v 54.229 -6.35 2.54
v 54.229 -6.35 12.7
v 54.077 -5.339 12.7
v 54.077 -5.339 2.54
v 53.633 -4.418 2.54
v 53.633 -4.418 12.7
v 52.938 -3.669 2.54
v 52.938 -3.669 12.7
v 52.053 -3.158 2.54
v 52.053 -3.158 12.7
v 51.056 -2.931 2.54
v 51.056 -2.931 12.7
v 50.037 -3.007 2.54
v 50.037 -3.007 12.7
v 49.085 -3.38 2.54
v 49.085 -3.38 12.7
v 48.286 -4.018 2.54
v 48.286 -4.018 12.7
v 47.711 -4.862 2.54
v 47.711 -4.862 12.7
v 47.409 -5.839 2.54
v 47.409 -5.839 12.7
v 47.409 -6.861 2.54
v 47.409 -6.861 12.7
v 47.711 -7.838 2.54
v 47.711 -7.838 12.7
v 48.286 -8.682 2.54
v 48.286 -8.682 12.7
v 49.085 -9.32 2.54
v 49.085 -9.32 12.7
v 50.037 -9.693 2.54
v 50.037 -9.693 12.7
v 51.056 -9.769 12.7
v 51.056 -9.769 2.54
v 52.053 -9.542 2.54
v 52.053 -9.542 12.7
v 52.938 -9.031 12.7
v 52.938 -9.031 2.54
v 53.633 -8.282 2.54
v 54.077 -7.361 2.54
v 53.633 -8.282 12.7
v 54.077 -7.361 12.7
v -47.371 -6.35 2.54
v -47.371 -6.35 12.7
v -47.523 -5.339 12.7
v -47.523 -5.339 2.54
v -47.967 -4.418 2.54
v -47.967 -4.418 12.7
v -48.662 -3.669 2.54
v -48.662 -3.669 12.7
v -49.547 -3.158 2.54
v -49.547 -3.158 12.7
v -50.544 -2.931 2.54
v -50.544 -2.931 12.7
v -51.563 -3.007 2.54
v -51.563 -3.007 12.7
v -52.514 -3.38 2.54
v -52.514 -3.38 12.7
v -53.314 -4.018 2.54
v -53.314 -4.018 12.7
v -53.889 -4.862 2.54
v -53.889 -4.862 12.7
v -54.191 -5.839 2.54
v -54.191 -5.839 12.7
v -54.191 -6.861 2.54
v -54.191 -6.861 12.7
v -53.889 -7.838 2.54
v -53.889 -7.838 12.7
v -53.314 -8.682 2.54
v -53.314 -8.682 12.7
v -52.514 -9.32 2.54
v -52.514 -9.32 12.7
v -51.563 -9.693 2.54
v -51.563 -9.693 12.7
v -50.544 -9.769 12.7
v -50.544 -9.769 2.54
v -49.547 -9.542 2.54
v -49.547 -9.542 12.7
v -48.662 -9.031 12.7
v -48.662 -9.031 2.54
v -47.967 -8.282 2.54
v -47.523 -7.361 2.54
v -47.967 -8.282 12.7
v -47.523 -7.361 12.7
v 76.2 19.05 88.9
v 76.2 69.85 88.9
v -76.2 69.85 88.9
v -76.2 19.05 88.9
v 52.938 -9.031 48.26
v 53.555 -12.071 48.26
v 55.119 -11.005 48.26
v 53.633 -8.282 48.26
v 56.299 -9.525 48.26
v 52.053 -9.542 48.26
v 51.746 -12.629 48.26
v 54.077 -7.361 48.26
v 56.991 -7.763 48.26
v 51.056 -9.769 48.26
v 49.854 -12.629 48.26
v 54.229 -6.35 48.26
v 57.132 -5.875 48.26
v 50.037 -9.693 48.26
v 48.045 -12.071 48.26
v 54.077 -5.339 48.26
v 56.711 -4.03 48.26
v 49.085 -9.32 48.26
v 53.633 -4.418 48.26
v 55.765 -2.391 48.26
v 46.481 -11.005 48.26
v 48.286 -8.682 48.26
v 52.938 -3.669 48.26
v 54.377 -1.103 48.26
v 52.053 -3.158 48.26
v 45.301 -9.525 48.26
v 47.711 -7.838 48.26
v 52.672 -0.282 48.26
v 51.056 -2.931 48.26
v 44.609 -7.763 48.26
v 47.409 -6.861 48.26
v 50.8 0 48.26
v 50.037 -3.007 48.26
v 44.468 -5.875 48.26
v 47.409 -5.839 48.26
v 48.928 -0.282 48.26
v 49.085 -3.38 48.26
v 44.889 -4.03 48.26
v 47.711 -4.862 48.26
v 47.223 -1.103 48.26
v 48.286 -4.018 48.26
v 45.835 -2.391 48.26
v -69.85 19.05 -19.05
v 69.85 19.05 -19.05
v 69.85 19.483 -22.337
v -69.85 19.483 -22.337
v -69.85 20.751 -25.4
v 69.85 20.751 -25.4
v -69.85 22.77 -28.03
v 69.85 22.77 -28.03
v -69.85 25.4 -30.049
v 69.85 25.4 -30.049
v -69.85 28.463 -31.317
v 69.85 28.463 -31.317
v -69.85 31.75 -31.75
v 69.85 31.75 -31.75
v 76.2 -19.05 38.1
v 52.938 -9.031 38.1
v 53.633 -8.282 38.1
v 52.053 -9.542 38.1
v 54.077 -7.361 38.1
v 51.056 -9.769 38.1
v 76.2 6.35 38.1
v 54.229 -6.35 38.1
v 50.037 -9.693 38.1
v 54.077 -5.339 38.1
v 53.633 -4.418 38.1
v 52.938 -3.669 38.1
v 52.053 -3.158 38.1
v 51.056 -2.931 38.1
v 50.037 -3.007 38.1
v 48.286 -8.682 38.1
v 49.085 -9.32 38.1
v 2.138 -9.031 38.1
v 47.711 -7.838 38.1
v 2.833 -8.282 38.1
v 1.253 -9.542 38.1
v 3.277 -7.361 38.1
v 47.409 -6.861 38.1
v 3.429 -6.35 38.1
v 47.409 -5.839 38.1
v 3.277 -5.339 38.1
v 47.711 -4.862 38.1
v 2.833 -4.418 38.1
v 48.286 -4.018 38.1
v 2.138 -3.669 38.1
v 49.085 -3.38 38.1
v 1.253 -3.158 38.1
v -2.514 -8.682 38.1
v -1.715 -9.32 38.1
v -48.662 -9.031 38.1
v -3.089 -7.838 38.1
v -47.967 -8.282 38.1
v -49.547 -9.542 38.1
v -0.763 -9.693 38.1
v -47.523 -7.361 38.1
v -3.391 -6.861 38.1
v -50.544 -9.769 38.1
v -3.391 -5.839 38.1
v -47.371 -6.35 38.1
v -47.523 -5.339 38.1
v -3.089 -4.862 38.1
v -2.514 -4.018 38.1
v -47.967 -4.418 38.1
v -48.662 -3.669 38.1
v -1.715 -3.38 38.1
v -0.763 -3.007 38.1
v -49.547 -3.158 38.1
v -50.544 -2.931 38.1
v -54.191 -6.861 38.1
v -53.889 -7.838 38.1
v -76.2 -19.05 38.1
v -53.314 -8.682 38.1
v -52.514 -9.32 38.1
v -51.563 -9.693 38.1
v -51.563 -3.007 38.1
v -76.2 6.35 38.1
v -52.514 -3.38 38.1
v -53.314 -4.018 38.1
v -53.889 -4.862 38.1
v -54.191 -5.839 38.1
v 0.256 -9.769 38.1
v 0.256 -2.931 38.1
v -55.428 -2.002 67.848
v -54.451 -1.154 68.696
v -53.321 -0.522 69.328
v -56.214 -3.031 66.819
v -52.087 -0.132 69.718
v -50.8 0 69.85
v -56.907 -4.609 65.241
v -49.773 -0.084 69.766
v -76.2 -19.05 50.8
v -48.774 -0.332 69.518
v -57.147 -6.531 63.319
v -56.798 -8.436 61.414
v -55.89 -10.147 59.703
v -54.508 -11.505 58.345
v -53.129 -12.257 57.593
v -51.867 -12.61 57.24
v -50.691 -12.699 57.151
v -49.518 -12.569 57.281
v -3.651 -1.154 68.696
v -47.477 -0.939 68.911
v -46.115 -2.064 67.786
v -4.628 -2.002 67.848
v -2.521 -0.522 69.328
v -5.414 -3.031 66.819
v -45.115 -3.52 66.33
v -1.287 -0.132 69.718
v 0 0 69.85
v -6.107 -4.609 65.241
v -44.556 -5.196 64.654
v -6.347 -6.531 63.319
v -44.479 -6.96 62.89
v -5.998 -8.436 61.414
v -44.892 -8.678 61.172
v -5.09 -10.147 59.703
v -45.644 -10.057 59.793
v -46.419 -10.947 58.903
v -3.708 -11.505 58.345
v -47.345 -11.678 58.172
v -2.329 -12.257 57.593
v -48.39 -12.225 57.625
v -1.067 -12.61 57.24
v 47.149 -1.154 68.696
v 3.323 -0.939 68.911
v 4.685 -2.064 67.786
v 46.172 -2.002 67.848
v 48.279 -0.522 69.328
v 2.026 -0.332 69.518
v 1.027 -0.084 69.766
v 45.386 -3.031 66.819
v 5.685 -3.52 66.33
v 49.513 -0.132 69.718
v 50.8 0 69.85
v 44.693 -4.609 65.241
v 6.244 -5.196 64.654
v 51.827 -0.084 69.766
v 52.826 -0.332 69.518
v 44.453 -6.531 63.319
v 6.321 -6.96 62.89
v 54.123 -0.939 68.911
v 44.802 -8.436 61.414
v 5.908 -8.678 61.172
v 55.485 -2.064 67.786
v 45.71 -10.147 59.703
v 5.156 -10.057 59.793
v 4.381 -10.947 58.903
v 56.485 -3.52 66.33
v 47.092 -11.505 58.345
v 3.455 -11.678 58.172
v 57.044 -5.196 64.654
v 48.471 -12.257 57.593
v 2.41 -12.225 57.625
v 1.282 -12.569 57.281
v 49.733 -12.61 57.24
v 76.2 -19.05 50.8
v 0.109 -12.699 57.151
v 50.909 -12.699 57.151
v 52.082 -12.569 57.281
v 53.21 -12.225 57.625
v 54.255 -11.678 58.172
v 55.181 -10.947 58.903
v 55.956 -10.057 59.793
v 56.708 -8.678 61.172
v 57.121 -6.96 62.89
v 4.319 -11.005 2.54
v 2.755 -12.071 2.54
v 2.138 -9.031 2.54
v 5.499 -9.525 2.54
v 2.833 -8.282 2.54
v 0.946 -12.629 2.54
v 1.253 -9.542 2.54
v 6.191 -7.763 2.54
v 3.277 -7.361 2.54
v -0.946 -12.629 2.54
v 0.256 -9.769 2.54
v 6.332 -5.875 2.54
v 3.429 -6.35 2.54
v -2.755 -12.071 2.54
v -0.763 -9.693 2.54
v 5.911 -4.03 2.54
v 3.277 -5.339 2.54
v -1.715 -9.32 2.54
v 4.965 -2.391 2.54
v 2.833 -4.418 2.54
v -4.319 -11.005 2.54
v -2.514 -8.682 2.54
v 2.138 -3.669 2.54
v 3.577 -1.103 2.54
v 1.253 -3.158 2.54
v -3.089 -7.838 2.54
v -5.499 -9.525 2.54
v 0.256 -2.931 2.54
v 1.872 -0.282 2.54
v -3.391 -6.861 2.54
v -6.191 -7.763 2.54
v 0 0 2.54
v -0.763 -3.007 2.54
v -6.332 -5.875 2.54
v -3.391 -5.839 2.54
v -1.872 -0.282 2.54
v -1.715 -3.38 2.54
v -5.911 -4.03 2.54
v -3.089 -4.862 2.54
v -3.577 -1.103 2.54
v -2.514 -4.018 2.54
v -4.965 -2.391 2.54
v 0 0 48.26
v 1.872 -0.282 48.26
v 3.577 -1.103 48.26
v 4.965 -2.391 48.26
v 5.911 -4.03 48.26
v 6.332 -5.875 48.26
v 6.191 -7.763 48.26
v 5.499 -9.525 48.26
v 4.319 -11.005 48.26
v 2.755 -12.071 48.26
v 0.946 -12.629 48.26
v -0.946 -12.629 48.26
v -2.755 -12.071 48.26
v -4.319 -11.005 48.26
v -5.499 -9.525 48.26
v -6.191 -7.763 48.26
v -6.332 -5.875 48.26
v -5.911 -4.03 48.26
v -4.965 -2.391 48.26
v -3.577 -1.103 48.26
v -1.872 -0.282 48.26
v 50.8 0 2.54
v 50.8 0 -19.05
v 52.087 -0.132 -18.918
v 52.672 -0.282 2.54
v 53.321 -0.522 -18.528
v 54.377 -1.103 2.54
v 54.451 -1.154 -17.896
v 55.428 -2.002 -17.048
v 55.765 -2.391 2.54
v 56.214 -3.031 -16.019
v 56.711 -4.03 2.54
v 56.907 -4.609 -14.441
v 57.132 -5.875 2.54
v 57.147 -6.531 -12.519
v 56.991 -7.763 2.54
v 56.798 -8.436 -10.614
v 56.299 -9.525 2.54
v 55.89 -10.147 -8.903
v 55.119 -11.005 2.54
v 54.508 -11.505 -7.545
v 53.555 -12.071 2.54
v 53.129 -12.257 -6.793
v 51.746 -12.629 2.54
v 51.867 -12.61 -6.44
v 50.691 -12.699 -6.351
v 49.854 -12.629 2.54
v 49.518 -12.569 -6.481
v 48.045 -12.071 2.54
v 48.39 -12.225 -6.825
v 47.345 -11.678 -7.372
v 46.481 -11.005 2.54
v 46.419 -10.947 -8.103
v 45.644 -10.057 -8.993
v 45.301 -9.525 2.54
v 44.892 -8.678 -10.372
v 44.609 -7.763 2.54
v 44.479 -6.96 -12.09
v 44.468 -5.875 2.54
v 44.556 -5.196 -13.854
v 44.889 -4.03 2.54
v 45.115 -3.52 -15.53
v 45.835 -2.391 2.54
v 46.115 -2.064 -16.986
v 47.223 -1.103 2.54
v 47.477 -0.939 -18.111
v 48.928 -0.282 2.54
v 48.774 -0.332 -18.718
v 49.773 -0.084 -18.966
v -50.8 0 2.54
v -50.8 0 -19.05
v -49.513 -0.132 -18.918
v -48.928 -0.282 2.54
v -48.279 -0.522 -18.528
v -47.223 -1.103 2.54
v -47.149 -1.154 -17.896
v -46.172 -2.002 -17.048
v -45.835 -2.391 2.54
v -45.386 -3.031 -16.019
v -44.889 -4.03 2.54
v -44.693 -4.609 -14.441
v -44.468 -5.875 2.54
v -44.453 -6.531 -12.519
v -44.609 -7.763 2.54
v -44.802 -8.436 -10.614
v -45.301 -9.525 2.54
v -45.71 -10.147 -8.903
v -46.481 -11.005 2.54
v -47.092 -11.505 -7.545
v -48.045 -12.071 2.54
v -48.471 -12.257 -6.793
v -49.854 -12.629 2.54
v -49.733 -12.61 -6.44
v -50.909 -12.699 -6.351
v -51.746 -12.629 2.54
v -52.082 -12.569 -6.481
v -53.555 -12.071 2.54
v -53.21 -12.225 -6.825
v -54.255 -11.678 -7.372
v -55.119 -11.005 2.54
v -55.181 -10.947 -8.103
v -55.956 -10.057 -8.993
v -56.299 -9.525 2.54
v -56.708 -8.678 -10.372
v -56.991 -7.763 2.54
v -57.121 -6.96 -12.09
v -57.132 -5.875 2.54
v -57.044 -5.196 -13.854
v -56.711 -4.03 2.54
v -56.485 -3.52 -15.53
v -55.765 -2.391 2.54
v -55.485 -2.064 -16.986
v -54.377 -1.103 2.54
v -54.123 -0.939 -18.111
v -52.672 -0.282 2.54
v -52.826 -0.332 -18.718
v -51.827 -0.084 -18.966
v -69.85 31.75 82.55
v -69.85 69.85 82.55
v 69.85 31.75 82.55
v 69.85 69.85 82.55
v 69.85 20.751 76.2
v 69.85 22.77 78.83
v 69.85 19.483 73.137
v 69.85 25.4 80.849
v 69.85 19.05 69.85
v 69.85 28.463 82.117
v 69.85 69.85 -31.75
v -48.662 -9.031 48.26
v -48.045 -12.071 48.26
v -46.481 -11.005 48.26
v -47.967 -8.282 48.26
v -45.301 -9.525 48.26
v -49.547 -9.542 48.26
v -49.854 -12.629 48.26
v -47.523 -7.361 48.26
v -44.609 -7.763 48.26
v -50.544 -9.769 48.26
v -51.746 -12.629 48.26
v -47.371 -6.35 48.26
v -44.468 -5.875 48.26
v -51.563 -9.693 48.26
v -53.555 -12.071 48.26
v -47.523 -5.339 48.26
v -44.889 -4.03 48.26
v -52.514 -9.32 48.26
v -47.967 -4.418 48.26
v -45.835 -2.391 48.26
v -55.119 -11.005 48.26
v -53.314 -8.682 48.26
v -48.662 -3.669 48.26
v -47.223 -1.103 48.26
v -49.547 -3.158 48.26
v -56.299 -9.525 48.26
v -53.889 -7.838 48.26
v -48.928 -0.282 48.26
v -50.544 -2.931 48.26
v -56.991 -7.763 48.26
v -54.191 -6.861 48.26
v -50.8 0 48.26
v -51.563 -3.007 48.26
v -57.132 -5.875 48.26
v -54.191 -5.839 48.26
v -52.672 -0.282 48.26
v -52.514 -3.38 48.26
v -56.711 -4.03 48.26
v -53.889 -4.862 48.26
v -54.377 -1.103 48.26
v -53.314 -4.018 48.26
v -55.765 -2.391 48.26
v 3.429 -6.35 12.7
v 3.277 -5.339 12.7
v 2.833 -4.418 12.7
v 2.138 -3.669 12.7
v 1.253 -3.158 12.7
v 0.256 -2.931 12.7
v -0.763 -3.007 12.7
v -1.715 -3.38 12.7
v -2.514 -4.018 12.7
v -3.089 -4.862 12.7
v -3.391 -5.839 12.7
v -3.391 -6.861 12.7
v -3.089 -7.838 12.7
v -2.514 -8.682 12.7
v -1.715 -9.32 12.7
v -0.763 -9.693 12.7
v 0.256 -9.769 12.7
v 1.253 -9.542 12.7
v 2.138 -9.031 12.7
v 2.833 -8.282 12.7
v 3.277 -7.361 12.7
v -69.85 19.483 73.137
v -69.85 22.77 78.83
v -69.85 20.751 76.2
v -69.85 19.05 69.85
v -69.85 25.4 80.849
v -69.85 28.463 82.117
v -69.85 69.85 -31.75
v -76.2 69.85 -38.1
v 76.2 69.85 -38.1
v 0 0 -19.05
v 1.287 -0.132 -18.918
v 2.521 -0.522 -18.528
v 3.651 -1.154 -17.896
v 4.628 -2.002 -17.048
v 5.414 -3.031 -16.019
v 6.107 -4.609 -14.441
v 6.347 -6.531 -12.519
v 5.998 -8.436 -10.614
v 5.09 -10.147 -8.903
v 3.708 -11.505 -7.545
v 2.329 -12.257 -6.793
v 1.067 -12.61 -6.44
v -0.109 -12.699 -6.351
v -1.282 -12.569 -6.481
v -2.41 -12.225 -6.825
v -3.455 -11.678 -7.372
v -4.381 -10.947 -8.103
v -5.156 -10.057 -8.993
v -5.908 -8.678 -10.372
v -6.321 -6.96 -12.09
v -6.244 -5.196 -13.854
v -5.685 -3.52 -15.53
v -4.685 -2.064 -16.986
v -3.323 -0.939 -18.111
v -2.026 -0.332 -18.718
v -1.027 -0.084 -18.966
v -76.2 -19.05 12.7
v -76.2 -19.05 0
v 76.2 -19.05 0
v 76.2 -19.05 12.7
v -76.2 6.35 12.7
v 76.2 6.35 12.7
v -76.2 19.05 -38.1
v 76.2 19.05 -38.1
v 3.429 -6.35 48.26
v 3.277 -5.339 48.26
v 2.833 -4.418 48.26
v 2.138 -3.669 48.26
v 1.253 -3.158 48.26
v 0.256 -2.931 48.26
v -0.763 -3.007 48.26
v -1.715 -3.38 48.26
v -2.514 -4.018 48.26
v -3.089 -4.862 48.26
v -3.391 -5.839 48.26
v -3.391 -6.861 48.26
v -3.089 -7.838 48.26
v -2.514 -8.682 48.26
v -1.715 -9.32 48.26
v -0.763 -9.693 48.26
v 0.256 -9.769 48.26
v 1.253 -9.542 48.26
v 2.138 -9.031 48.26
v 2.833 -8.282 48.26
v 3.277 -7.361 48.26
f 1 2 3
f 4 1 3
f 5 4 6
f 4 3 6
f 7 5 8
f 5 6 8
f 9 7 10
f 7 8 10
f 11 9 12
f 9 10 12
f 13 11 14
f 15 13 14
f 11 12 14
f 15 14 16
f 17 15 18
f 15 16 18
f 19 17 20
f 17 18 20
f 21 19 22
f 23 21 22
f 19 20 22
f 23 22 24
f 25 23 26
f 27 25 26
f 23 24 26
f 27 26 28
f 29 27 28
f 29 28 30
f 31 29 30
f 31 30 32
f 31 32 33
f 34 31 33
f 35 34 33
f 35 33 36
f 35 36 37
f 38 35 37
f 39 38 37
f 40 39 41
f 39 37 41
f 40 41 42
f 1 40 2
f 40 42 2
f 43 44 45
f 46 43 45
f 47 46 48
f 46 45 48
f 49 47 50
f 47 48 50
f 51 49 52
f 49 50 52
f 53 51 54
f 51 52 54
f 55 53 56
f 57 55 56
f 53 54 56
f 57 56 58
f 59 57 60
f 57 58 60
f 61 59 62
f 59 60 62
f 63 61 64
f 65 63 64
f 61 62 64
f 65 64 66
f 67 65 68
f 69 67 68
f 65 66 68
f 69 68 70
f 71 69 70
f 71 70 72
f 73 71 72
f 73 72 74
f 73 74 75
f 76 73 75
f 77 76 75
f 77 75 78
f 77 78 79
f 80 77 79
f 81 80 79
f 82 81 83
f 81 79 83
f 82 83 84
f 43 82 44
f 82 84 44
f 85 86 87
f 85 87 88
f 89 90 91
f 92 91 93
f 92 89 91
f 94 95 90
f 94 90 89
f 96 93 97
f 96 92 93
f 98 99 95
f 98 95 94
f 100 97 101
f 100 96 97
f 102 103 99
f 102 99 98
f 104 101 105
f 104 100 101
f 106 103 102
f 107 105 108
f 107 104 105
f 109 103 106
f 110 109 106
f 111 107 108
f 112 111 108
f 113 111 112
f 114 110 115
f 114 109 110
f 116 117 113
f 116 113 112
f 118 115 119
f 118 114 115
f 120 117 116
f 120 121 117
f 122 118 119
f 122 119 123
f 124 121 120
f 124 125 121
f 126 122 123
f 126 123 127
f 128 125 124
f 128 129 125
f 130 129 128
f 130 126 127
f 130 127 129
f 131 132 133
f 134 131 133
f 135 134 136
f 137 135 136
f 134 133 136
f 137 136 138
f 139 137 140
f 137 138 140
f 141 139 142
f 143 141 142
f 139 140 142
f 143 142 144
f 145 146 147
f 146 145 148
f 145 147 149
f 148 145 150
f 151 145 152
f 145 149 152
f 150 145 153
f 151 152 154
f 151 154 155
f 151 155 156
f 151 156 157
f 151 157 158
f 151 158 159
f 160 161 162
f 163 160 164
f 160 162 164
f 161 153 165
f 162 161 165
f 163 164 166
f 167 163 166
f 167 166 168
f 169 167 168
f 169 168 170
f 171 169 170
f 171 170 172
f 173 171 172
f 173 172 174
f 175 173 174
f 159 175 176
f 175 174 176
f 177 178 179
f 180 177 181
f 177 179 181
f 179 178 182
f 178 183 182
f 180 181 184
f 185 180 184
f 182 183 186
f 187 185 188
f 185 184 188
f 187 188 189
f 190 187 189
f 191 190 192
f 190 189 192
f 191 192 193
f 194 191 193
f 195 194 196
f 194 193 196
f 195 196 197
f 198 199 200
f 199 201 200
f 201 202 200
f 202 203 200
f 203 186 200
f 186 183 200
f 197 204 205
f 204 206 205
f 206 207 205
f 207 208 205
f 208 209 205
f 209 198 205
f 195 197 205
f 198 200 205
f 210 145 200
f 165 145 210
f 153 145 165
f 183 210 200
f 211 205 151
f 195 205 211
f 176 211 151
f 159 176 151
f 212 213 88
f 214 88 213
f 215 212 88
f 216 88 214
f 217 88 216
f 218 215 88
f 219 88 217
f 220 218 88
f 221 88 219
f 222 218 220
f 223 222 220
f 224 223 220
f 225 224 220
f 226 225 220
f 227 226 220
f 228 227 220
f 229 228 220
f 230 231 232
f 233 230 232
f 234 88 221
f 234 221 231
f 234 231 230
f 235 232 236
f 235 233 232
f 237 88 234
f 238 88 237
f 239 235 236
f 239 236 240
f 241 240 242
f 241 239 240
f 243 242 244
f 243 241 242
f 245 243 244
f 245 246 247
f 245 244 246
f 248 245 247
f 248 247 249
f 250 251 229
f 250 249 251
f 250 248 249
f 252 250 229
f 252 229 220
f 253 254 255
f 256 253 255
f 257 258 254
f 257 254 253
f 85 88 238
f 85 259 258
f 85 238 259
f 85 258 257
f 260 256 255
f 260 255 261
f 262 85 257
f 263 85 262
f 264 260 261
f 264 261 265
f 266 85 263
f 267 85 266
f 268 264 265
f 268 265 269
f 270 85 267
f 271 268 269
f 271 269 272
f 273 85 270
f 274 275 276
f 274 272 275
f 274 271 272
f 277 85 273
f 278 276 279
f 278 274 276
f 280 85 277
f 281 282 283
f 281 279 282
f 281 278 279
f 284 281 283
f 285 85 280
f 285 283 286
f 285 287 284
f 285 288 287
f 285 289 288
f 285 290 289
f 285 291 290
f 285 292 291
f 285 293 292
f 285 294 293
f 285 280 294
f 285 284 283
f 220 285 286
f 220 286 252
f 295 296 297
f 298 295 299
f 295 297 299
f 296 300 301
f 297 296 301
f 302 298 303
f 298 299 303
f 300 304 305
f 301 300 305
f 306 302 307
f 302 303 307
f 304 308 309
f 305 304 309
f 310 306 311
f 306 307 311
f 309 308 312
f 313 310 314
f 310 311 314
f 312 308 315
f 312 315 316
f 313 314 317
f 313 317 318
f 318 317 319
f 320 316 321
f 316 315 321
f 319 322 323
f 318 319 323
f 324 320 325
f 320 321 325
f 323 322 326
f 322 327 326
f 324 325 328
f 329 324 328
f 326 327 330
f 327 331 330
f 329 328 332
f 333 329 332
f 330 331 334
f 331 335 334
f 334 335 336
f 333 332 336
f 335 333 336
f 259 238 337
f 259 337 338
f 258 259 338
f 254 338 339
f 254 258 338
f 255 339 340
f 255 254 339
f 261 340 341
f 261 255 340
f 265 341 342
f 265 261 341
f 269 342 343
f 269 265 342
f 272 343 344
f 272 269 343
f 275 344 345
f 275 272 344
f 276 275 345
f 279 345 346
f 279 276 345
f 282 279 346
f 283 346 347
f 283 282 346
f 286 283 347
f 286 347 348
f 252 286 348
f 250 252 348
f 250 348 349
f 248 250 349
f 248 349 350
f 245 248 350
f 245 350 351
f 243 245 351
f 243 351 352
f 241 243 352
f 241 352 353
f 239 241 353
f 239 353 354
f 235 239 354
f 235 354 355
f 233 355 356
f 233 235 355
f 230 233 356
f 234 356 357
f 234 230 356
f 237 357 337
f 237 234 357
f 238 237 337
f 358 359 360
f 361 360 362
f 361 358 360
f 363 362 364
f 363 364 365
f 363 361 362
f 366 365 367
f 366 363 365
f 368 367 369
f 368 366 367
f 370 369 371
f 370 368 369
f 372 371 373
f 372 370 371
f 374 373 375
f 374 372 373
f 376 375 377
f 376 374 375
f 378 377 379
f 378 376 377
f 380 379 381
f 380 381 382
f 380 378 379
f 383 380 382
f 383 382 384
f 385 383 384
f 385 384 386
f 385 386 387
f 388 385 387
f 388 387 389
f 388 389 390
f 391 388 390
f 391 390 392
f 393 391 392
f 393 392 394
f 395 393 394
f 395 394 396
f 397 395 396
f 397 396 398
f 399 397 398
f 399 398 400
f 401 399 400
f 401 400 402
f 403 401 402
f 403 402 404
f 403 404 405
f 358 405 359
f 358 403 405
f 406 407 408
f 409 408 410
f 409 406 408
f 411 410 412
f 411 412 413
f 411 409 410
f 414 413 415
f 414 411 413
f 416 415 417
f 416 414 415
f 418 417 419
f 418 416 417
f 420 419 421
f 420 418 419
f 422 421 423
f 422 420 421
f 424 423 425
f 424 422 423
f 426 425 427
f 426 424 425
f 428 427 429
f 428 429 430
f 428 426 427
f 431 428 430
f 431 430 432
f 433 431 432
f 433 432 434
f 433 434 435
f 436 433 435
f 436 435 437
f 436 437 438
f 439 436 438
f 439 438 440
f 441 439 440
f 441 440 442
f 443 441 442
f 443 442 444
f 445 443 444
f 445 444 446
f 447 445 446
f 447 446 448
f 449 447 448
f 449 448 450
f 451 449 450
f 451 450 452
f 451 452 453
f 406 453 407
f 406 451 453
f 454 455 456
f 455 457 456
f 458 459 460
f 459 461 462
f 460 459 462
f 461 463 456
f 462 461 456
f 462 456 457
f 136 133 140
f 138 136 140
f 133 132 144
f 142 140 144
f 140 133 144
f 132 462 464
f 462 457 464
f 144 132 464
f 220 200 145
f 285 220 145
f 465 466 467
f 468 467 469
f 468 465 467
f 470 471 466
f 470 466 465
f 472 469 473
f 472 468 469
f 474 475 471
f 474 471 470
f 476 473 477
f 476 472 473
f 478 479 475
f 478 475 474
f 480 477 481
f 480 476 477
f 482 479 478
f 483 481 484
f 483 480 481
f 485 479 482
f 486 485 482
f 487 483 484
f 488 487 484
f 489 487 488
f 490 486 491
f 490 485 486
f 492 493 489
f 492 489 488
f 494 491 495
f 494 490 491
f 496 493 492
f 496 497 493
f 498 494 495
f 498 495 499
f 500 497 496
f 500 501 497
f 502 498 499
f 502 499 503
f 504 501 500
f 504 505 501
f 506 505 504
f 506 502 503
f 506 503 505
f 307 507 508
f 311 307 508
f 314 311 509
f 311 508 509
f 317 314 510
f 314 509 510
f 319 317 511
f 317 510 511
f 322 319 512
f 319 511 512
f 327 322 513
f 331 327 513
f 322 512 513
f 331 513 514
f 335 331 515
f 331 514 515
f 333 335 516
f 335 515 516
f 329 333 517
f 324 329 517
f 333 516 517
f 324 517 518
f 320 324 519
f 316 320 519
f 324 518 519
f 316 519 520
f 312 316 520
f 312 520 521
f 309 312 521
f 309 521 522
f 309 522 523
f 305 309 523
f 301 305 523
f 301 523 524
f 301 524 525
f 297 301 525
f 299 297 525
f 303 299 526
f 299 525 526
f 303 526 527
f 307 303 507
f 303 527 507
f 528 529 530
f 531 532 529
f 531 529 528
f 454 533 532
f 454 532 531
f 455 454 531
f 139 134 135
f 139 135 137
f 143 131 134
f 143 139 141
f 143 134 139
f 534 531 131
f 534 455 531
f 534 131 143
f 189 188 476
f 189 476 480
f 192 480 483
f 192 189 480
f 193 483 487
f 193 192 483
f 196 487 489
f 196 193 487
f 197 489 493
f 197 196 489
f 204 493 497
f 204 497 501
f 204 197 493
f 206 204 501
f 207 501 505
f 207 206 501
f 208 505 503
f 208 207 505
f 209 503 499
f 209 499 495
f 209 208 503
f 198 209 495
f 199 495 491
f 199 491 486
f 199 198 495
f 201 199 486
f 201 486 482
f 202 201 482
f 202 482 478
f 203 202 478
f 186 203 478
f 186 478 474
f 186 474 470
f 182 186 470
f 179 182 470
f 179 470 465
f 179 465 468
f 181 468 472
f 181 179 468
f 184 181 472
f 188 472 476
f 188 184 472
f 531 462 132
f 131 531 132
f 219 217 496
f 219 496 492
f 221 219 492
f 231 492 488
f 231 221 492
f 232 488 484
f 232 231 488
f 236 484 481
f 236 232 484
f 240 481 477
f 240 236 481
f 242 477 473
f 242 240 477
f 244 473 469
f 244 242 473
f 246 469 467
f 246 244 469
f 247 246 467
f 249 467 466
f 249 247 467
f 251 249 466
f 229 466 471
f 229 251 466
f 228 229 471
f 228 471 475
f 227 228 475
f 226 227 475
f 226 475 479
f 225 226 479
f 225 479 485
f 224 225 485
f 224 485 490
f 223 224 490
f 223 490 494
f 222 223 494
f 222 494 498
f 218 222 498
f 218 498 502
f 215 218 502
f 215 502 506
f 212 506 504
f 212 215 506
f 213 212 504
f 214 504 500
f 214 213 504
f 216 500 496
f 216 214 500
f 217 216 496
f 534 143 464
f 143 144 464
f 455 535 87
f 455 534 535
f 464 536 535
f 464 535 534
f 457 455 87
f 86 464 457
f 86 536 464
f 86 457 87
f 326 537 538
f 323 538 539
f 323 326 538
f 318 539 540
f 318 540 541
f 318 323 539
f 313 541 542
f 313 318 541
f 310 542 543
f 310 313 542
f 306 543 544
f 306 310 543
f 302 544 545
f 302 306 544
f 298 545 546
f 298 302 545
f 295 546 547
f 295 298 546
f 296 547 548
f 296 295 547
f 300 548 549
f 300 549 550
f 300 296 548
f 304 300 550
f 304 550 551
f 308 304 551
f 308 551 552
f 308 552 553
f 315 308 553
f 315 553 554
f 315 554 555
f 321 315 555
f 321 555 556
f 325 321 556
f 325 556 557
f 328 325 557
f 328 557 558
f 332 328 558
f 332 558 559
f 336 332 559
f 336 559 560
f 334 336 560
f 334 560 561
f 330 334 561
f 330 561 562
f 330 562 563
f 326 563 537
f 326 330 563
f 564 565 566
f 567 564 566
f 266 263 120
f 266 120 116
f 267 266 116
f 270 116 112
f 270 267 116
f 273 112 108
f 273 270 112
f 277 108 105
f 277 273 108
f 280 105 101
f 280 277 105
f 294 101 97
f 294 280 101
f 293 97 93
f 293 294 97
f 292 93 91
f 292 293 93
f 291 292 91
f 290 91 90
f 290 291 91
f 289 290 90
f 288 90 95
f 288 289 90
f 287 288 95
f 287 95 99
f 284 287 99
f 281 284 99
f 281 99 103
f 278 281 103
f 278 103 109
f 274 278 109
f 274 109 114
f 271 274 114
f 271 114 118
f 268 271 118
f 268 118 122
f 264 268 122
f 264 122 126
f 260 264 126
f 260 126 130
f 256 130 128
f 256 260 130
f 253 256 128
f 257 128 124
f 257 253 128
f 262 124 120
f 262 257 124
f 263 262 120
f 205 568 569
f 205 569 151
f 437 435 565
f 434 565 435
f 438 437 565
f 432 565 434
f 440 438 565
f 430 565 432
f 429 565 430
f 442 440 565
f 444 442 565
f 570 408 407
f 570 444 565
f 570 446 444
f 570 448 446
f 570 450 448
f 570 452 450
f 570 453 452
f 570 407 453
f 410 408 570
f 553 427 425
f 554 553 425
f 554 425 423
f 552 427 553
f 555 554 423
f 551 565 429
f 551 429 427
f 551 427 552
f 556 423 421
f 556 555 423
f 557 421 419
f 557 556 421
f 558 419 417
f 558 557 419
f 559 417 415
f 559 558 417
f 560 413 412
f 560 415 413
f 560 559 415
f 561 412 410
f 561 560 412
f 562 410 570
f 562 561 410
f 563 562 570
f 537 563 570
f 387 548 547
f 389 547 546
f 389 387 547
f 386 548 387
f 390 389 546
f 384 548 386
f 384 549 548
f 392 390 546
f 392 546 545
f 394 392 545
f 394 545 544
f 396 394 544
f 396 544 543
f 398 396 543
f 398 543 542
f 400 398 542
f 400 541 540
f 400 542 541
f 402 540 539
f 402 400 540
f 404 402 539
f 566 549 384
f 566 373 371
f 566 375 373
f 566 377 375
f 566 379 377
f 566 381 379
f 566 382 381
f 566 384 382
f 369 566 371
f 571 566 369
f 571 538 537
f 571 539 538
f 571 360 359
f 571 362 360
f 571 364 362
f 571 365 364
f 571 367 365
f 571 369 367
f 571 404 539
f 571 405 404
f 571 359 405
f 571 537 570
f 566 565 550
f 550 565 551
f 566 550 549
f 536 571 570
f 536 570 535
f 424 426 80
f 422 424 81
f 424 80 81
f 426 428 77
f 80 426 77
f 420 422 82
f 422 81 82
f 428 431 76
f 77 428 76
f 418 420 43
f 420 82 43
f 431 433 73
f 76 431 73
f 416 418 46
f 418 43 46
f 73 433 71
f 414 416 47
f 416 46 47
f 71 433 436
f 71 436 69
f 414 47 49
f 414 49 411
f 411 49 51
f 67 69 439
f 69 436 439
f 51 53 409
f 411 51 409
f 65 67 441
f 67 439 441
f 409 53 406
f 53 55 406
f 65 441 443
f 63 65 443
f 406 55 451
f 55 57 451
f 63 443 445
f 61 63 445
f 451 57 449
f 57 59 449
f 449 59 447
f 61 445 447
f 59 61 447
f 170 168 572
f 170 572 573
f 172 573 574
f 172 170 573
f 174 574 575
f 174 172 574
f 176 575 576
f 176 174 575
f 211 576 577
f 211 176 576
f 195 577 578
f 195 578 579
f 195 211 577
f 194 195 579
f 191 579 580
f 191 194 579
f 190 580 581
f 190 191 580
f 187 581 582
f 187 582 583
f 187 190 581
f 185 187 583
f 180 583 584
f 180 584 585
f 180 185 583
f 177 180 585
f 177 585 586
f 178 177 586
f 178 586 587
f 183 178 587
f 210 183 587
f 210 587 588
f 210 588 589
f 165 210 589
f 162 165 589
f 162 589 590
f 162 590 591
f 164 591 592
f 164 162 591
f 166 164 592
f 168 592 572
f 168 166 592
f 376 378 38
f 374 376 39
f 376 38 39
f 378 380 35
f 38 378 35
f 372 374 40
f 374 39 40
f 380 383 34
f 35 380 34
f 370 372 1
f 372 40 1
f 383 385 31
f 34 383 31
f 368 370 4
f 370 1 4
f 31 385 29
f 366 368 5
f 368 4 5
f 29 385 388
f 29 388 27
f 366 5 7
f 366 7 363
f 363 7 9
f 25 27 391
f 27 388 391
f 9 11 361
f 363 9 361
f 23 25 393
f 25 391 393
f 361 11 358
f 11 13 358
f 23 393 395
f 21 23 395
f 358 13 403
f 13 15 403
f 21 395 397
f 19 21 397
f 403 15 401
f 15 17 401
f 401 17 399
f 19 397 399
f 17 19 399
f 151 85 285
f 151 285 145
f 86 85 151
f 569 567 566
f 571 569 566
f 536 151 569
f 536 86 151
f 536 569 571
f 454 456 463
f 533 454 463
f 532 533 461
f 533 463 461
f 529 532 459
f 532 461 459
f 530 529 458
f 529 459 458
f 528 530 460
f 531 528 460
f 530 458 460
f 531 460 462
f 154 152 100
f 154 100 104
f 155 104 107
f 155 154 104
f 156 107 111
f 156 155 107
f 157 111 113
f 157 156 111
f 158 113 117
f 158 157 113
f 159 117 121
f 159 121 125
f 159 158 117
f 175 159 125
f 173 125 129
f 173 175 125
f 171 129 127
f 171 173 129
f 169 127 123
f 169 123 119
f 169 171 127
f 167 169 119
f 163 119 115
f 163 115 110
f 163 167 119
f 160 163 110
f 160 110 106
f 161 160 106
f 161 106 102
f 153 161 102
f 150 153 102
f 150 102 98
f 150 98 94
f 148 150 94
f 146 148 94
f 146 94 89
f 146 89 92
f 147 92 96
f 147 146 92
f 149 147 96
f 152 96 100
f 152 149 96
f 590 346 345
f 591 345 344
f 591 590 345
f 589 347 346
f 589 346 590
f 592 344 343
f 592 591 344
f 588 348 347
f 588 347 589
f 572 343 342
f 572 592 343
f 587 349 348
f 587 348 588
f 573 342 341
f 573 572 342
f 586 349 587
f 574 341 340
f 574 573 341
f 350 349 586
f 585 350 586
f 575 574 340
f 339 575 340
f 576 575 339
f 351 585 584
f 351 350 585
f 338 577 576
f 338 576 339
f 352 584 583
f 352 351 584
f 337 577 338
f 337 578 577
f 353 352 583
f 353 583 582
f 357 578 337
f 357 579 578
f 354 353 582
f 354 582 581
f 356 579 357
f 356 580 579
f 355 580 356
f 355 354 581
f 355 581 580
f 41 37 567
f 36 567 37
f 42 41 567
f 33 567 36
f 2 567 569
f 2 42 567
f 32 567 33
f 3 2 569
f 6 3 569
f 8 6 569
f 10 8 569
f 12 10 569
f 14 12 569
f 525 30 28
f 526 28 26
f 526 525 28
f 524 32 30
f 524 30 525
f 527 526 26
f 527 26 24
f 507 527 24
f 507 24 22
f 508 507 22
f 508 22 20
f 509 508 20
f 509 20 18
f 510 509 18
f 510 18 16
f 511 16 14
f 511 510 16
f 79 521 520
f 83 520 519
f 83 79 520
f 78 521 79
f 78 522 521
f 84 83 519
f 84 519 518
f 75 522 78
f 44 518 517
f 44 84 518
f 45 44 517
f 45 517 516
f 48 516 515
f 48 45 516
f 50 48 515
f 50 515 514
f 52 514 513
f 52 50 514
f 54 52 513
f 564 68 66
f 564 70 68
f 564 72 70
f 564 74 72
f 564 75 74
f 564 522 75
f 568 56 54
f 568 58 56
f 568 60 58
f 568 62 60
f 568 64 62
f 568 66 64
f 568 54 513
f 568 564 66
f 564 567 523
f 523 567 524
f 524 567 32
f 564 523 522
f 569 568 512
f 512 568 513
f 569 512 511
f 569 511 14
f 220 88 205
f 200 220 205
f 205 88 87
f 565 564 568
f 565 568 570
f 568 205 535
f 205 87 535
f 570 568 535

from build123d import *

# Parameters (mm, degrees)
SKETCH1_W               = 152.4
SKETCH1_H               = 38.1
BOSS_EXTRUDE1_DEPTH     = 50.8
SKETCH2_W               = 25.4
SKETCH2_H               = 25.4
CUT_EXTRUDE1_DEPTH      = 152.4
BOSS_EXTRUDE2_DEPTH     = 152.4
CUT_EXTRUDE3_DEPTH      = 129.420802443
CUT_EXTRUDE3_DEPTH_BACK = 129.420802443
SKETCH6_R               = 6.35
SKETCH10_R              = 6.35
SKETCH10_R_2            = 3.429
BOSS_EXTRUDE3_DEPTH     = 10.16
CUT_EXTRUDE4_DEPTH      = 69.85


with BuildPart() as part:
    # Sketch1 → Boss-Extrude1 (new body)
    with BuildSketch(Plane.XY):
        Rectangle(SKETCH1_W, SKETCH1_H)
    extrude(amount=BOSS_EXTRUDE1_DEPTH)

    # Sketch2 → Cut-Extrude1 (cut)
    with BuildSketch(Plane.ZY.offset(76.2)):
        with Locations((25.4, -6.35)):
            Rectangle(SKETCH2_W, SKETCH2_H)
    extrude(amount=-CUT_EXTRUDE1_DEPTH, mode=Mode.SUBTRACT)

    # Sketch5 → Boss-Extrude2 (add)
    with BuildSketch(Plane(origin=(76.2, 0, 0), x_dir=(0, 0, -1), z_dir=(1, 0, 0))):
        Polygon((0, -19.05), (38.1, 19.05), (38.1, 69.85), (-88.9, 69.85), (-88.9, 19.05), (-50.8, -19.05), (-50.8, 19.05), (0, 19.05), align=None)
    extrude(amount=-BOSS_EXTRUDE2_DEPTH)

    # Sketch6 → Cut-Extrude3 (cut, two sides: drawn at the far end of the back side and taken through both)
    with BuildSketch(Plane(origin=(0, 0, 38.1), x_dir=(-1, 0, 0), z_dir=(0, 0, -1)).offset(-CUT_EXTRUDE3_DEPTH_BACK)):
        with Locations(Location((0, -6.35, 0), (0, 0, 90))):
            Circle(SKETCH6_R)
        with Locations(Location((-50.8, -6.35, 0), (0, 0, 90))):
            Circle(SKETCH6_R)
        with Locations(Location((50.8, -6.35, 0), (0, 0, 90))):
            Circle(SKETCH6_R)
    extrude(amount=CUT_EXTRUDE3_DEPTH + CUT_EXTRUDE3_DEPTH_BACK, mode=Mode.SUBTRACT)

    # Sketch10 → Boss-Extrude3 (add)
    # profile 1 of 3: a face of its own
    with BuildSketch(Plane.XY.offset(12.7)):
        with Locations(Location((-50.8, -6.35, 0), (0, 0, 90))):
            Circle(SKETCH10_R)
        with Locations((-50.8, -6.35)):
            Circle(SKETCH10_R_2, mode=Mode.SUBTRACT)
    # profile 2 of 3: a face of its own
    with BuildSketch(Plane.XY.offset(12.7)):
        with Locations(Location((0, -6.35, 0), (0, 0, 90))):
            Circle(SKETCH10_R)
        with Locations((0, -6.35)):
            Circle(SKETCH10_R_2, mode=Mode.SUBTRACT)
    # profile 3 of 3: a face of its own
    with BuildSketch(Plane.XY.offset(12.7)):
        with Locations(Location((50.8, -6.35, 0), (0, 0, 90))):
            Circle(SKETCH10_R)
        with Locations((50.8, -6.35)):
            Circle(SKETCH10_R_2, mode=Mode.SUBTRACT)
    boss_extrude3 = extrude(amount=-BOSS_EXTRUDE3_DEPTH)

    # Sketch11 → Cut-Extrude4 (cut, symmetric)
    with BuildSketch(Plane(origin=(0, 0, 0), x_dir=(0, 0, -1), z_dir=(1, 0, 0))):
        with BuildLine():
            Line((-82.55, 69.85), (-82.55, 31.75))
            ThreePointArc((-82.55, 31.75), (-78.830256121, 22.769743879), (-69.85, 19.05))
            Line((-69.85, 19.05), (19.05, 19.05))
            ThreePointArc((19.05, 19.05), (28.030256121, 22.769743879), (31.75, 31.75))
            Line((31.75, 31.75), (31.75, 69.85))
            Line((31.75, 69.85), (-82.55, 69.85))
        make_face()
    extrude(amount=CUT_EXTRUDE4_DEPTH, both=True, mode=Mode.SUBTRACT)

    # Mirror1: Boss-Extrude3 across plane
    add(boss_extrude3.mirror(Plane.XY.offset(25.4)))


solid = part.part
